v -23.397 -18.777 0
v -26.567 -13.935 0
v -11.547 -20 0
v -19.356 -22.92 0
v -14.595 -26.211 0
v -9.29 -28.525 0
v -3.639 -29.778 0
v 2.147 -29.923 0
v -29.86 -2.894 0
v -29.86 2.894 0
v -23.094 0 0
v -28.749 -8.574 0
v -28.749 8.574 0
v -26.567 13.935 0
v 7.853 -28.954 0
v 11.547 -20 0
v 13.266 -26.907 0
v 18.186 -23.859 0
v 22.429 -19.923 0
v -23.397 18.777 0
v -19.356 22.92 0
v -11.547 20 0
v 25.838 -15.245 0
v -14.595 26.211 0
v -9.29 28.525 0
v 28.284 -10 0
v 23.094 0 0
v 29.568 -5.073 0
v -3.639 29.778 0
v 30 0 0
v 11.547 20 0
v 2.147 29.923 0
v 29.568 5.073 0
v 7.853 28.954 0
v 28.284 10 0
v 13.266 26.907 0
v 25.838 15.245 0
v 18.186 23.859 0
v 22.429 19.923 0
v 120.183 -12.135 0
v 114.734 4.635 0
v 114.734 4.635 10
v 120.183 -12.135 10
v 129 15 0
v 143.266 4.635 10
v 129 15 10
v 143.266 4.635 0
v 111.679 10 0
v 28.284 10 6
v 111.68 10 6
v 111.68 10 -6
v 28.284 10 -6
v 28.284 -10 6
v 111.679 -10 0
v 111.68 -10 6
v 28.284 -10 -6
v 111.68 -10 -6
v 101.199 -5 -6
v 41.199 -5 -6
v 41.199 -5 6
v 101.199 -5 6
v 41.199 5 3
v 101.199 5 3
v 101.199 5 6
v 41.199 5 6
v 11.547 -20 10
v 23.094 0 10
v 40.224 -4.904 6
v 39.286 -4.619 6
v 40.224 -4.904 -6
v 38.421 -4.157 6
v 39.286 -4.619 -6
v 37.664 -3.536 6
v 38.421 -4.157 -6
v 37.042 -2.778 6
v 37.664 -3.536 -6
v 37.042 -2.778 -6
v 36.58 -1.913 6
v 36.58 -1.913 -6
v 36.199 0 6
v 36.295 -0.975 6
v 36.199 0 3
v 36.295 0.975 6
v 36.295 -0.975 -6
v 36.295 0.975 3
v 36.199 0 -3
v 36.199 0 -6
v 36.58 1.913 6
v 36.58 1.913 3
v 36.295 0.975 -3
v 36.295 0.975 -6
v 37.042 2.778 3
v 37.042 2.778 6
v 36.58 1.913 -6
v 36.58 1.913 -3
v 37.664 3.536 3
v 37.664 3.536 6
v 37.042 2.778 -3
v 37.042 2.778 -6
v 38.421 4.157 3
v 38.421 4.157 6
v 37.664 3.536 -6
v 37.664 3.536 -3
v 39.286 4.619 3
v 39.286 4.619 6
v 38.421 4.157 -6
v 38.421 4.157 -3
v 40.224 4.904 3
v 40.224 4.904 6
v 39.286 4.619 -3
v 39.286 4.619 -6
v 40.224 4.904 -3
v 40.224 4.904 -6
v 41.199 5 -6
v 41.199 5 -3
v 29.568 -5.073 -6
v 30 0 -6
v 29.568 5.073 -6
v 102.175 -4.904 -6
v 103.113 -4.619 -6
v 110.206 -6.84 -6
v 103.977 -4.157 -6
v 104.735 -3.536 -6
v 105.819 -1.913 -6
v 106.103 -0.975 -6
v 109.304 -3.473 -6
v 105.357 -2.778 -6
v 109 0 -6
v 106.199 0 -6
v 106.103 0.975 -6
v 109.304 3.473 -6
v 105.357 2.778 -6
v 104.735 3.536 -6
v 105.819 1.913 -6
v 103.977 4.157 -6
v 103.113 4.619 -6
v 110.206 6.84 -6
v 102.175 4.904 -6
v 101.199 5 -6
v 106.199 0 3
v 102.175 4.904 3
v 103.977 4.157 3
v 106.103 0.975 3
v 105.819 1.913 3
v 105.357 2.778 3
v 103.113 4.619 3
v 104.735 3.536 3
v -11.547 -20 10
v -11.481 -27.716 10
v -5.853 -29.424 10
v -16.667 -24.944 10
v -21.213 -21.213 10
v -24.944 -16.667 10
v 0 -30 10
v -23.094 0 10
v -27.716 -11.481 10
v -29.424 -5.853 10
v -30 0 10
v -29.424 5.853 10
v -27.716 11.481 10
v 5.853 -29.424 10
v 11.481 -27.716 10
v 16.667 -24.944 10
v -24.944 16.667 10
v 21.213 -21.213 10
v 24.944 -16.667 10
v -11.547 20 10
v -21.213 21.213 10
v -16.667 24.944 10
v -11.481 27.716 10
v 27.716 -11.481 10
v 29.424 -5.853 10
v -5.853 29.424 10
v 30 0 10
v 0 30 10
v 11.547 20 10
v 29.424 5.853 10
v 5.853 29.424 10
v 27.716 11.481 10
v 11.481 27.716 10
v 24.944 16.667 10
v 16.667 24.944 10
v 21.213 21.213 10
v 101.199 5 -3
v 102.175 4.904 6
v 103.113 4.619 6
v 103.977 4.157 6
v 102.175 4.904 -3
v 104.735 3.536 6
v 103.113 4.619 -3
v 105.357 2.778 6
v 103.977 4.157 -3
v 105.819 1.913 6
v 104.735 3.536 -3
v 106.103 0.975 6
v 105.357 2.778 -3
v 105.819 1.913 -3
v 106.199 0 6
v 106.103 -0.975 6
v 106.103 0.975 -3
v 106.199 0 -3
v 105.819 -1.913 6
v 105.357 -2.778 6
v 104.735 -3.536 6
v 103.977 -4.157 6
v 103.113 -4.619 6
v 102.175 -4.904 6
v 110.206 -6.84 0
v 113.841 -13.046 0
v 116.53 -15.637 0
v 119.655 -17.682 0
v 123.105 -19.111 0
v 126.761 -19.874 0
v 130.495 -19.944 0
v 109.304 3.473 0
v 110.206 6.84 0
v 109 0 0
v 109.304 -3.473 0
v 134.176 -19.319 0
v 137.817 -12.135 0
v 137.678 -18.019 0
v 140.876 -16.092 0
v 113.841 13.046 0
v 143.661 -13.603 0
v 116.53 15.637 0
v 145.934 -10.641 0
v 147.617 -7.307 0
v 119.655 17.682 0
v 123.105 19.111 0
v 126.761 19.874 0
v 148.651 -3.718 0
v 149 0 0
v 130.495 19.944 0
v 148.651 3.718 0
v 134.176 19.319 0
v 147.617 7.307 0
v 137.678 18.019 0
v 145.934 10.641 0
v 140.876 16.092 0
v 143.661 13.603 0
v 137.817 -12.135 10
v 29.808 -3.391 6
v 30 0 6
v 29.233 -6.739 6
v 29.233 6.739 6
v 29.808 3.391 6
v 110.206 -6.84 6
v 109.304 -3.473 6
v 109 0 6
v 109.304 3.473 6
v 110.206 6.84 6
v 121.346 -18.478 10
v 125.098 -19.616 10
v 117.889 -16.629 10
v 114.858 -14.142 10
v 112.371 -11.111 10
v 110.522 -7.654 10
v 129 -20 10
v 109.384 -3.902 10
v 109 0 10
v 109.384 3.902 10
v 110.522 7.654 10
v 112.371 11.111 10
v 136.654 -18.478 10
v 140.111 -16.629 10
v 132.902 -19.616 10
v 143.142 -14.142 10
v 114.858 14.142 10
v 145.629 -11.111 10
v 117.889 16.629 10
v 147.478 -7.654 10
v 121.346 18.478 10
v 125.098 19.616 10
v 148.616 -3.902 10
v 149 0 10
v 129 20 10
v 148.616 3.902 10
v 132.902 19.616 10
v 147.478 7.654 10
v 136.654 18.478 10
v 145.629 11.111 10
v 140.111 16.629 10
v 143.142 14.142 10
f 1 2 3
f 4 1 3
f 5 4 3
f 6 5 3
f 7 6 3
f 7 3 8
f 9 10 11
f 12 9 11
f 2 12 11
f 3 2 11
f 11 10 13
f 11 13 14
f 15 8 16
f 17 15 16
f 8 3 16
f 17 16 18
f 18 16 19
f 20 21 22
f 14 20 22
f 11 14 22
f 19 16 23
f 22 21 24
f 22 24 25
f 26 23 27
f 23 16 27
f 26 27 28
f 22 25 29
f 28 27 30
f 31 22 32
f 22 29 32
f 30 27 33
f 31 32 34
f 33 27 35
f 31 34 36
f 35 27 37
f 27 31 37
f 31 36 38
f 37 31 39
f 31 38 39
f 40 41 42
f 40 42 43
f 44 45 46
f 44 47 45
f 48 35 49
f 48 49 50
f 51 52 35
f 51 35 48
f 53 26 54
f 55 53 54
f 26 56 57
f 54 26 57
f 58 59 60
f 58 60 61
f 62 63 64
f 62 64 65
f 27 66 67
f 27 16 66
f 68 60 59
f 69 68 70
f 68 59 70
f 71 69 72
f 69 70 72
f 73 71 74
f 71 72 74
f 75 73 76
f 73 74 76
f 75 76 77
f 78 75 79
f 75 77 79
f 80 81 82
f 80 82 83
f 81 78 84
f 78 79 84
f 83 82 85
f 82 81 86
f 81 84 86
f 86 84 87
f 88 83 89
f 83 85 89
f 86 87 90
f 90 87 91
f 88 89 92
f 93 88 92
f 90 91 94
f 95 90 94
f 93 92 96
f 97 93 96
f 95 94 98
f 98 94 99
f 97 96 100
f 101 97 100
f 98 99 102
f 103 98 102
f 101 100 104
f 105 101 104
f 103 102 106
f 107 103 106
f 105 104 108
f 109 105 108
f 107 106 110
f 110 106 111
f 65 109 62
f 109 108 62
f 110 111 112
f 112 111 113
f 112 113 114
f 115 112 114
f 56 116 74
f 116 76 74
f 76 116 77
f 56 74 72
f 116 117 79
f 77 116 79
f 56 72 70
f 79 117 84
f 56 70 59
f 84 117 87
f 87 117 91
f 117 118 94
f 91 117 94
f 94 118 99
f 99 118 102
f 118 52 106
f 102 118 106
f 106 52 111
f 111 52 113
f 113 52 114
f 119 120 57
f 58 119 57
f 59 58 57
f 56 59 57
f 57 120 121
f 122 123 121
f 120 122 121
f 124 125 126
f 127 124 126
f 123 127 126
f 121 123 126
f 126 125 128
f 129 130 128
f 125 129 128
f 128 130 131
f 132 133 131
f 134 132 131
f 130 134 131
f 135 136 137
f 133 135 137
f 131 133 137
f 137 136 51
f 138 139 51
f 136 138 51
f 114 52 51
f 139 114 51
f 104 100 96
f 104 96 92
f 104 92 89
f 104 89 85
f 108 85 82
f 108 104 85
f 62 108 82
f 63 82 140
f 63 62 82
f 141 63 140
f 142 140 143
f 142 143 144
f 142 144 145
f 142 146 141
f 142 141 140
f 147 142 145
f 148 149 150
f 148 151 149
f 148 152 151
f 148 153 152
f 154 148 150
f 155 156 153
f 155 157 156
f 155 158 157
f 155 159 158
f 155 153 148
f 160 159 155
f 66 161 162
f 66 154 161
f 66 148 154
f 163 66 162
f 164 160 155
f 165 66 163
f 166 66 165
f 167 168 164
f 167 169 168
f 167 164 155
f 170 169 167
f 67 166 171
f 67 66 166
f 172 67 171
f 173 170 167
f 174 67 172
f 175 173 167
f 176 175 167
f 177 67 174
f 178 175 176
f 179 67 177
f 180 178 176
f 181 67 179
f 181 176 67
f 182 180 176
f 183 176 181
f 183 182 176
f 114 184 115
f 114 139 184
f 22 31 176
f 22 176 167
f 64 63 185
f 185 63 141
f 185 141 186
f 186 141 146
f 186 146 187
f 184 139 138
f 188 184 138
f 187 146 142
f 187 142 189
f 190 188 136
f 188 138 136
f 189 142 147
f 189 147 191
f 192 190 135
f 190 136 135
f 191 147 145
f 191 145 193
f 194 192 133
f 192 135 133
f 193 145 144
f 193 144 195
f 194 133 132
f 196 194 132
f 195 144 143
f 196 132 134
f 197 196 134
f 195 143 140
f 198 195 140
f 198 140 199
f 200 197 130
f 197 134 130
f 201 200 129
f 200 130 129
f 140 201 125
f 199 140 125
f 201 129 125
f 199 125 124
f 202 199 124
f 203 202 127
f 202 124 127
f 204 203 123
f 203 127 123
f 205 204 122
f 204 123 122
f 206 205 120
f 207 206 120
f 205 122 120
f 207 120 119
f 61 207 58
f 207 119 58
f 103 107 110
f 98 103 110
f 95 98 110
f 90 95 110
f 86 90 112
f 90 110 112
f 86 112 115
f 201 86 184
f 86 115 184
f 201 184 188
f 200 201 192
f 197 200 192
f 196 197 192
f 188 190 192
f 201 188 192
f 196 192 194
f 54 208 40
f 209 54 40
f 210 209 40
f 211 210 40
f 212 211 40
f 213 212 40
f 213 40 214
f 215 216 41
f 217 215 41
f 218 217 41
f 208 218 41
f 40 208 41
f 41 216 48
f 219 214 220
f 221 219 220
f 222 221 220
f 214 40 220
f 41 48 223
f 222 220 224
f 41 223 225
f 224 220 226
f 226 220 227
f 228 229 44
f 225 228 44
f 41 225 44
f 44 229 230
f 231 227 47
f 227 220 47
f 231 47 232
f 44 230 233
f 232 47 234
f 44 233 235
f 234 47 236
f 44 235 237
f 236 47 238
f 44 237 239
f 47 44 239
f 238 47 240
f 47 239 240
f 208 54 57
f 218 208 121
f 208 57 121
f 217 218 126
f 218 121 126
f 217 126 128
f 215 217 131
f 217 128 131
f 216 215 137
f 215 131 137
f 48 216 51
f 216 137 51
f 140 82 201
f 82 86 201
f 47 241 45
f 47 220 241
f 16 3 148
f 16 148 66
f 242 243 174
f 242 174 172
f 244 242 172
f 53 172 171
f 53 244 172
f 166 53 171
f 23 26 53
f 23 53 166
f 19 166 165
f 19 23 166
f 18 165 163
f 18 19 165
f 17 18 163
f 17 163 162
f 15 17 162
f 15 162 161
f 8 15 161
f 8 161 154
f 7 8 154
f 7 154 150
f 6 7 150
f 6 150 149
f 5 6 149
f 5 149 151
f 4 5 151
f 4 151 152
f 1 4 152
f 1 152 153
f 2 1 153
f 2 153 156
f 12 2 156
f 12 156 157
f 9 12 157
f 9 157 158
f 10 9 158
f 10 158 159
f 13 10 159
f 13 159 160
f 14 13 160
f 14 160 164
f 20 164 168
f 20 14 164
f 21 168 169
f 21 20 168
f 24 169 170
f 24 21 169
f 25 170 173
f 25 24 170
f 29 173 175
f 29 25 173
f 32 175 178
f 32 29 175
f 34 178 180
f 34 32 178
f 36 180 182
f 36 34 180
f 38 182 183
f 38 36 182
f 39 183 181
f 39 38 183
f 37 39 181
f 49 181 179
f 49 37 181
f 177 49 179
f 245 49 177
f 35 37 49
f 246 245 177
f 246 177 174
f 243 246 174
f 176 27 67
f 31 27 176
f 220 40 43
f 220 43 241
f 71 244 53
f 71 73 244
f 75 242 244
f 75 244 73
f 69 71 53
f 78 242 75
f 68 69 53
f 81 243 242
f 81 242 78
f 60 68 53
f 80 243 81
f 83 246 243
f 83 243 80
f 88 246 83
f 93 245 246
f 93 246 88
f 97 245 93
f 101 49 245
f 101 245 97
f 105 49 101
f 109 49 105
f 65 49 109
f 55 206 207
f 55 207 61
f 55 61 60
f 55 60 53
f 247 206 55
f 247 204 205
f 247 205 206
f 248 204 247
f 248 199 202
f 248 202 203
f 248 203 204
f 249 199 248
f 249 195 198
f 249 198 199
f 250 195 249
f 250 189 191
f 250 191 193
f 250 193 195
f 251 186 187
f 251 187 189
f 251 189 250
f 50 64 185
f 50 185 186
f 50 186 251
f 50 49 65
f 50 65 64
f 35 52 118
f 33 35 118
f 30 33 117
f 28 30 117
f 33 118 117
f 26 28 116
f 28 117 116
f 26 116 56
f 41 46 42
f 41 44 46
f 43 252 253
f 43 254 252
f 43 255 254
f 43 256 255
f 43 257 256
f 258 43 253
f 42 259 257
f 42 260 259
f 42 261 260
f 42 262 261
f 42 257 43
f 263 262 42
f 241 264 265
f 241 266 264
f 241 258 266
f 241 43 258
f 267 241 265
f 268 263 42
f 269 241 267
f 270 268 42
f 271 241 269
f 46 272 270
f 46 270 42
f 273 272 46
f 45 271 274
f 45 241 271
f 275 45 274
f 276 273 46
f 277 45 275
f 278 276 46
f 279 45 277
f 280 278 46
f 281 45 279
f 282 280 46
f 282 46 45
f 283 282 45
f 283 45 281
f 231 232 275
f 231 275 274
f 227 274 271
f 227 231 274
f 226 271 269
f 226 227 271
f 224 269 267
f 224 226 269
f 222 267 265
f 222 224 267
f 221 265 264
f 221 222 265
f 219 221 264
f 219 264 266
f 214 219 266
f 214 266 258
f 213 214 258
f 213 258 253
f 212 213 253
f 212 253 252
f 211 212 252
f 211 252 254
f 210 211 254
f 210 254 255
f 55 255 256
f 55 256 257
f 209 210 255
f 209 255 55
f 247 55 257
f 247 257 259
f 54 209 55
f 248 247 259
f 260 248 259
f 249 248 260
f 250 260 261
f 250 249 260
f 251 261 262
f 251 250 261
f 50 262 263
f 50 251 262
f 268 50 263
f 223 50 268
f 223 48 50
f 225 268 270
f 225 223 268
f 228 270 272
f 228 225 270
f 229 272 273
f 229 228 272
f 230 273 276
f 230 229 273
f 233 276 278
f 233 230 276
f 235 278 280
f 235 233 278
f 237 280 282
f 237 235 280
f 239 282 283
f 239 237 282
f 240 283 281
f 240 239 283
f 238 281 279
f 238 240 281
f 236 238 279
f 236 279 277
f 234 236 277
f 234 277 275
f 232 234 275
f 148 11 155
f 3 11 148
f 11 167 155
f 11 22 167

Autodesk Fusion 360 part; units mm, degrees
sketch "Sketch1" plane through (0, 0, 0) normal (0, 0, 1) x (1, 0, 0) in component "ex2"
  circle A0 centre (0, 0) radius 30
  circle A1 centre (129, 0) radius 20
  line L0 (0, 0) -> (0, 43.8518) construction
  line L1 (129, 0) -> (129, 43.6821) construction
  line L2 (-11.547, 20) -> (-23.094, 0)
  line L3 (-23.094, 0) -> (-11.547, -20)
  line L4 (-11.547, -20) -> (11.547, -20)
  line L5 (11.547, -20) -> (23.094, 0)
  line L6 (23.094, 0) -> (11.547, 20)
  line L7 (11.547, 20) -> (-11.547, 20)
  line L8 (129, 15) -> (114.7342, 4.6353)
  line L9 (114.7342, 4.6353) -> (120.1832, -12.1353)
  line L10 (120.1832, -12.1353) -> (137.8168, -12.1353)
  line L11 (137.8168, -12.1353) -> (143.2658, 4.6353)
  line L12 (143.2658, 4.6353) -> (129, 15)
  line L13 (28.2843, 10) -> (111.6795, 10)
  line L14 (49.2985, 10) -> (49.2985, -10) construction
  line L15 (49.2985, 0) -> (56, 0) construction
  line L16 (28.2843, -10) -> (111.6795, -10)
  line L17 (119.4894, -10) -> (120.196, -10)
  line L18 (30, 0) -> (109, 0)
  line L19 (71.1993, 0) -> (71.1993, 28.9403) construction
  line L20 (101.1993, 5) -> (41.1993, 5)
  line L21 (41.1993, -5) -> (101.1993, -5)
  line L22 (101.1993, 5) -> (41.1993, -5) construction
  line L23 (41.1993, 5) -> (101.1993, -5) construction
  arc A2 (42.8209, 4.7297) -> (42.8209, -4.7297) centre (41.1993, 0) ccw
  arc A3 (99.5777, -4.7297) -> (99.5777, 4.7297) centre (101.1993, 0) ccw
  point P0 (129, 0)
  point P1 (71.1993, 0)
  dimension "d9" = 60
  dimension "d10" = 40
  dimension "d11" = 129
  dimension "d12" = 20
  dimension "d13" = 15
  dimension "d14" = 10
  dimension "d15" = 10
  dimension "d16" = 60
  dimension "d17" = 10
extrude "Extrude1" add sketch "Sketch1" along normal blind 10 contours A0 | A1 makes body 1 at (29.8509, 2.987, 6.6667) makes body 2 at (148.9006, -1.9914, 3.3333) in component "ex2"
extrude "Extrude2" add sketch "Sketch1" along normal mid plane 12 contours A0 A1 L16 L18 L21 A2 A3 | A0 A1 L13 L18 L20 A2 A3 bodies 1 2 in component "ex2"
extrude "Extrude3" add sketch "Sketch1" along normal mid plane 6 contours L18 L20 A2 A3 bodies 1 in component "ex2"
component "ex2" placed x (1, 0, 0) y (0, 1, 0) z (0, 0, 1) at (0, 0, 0)
